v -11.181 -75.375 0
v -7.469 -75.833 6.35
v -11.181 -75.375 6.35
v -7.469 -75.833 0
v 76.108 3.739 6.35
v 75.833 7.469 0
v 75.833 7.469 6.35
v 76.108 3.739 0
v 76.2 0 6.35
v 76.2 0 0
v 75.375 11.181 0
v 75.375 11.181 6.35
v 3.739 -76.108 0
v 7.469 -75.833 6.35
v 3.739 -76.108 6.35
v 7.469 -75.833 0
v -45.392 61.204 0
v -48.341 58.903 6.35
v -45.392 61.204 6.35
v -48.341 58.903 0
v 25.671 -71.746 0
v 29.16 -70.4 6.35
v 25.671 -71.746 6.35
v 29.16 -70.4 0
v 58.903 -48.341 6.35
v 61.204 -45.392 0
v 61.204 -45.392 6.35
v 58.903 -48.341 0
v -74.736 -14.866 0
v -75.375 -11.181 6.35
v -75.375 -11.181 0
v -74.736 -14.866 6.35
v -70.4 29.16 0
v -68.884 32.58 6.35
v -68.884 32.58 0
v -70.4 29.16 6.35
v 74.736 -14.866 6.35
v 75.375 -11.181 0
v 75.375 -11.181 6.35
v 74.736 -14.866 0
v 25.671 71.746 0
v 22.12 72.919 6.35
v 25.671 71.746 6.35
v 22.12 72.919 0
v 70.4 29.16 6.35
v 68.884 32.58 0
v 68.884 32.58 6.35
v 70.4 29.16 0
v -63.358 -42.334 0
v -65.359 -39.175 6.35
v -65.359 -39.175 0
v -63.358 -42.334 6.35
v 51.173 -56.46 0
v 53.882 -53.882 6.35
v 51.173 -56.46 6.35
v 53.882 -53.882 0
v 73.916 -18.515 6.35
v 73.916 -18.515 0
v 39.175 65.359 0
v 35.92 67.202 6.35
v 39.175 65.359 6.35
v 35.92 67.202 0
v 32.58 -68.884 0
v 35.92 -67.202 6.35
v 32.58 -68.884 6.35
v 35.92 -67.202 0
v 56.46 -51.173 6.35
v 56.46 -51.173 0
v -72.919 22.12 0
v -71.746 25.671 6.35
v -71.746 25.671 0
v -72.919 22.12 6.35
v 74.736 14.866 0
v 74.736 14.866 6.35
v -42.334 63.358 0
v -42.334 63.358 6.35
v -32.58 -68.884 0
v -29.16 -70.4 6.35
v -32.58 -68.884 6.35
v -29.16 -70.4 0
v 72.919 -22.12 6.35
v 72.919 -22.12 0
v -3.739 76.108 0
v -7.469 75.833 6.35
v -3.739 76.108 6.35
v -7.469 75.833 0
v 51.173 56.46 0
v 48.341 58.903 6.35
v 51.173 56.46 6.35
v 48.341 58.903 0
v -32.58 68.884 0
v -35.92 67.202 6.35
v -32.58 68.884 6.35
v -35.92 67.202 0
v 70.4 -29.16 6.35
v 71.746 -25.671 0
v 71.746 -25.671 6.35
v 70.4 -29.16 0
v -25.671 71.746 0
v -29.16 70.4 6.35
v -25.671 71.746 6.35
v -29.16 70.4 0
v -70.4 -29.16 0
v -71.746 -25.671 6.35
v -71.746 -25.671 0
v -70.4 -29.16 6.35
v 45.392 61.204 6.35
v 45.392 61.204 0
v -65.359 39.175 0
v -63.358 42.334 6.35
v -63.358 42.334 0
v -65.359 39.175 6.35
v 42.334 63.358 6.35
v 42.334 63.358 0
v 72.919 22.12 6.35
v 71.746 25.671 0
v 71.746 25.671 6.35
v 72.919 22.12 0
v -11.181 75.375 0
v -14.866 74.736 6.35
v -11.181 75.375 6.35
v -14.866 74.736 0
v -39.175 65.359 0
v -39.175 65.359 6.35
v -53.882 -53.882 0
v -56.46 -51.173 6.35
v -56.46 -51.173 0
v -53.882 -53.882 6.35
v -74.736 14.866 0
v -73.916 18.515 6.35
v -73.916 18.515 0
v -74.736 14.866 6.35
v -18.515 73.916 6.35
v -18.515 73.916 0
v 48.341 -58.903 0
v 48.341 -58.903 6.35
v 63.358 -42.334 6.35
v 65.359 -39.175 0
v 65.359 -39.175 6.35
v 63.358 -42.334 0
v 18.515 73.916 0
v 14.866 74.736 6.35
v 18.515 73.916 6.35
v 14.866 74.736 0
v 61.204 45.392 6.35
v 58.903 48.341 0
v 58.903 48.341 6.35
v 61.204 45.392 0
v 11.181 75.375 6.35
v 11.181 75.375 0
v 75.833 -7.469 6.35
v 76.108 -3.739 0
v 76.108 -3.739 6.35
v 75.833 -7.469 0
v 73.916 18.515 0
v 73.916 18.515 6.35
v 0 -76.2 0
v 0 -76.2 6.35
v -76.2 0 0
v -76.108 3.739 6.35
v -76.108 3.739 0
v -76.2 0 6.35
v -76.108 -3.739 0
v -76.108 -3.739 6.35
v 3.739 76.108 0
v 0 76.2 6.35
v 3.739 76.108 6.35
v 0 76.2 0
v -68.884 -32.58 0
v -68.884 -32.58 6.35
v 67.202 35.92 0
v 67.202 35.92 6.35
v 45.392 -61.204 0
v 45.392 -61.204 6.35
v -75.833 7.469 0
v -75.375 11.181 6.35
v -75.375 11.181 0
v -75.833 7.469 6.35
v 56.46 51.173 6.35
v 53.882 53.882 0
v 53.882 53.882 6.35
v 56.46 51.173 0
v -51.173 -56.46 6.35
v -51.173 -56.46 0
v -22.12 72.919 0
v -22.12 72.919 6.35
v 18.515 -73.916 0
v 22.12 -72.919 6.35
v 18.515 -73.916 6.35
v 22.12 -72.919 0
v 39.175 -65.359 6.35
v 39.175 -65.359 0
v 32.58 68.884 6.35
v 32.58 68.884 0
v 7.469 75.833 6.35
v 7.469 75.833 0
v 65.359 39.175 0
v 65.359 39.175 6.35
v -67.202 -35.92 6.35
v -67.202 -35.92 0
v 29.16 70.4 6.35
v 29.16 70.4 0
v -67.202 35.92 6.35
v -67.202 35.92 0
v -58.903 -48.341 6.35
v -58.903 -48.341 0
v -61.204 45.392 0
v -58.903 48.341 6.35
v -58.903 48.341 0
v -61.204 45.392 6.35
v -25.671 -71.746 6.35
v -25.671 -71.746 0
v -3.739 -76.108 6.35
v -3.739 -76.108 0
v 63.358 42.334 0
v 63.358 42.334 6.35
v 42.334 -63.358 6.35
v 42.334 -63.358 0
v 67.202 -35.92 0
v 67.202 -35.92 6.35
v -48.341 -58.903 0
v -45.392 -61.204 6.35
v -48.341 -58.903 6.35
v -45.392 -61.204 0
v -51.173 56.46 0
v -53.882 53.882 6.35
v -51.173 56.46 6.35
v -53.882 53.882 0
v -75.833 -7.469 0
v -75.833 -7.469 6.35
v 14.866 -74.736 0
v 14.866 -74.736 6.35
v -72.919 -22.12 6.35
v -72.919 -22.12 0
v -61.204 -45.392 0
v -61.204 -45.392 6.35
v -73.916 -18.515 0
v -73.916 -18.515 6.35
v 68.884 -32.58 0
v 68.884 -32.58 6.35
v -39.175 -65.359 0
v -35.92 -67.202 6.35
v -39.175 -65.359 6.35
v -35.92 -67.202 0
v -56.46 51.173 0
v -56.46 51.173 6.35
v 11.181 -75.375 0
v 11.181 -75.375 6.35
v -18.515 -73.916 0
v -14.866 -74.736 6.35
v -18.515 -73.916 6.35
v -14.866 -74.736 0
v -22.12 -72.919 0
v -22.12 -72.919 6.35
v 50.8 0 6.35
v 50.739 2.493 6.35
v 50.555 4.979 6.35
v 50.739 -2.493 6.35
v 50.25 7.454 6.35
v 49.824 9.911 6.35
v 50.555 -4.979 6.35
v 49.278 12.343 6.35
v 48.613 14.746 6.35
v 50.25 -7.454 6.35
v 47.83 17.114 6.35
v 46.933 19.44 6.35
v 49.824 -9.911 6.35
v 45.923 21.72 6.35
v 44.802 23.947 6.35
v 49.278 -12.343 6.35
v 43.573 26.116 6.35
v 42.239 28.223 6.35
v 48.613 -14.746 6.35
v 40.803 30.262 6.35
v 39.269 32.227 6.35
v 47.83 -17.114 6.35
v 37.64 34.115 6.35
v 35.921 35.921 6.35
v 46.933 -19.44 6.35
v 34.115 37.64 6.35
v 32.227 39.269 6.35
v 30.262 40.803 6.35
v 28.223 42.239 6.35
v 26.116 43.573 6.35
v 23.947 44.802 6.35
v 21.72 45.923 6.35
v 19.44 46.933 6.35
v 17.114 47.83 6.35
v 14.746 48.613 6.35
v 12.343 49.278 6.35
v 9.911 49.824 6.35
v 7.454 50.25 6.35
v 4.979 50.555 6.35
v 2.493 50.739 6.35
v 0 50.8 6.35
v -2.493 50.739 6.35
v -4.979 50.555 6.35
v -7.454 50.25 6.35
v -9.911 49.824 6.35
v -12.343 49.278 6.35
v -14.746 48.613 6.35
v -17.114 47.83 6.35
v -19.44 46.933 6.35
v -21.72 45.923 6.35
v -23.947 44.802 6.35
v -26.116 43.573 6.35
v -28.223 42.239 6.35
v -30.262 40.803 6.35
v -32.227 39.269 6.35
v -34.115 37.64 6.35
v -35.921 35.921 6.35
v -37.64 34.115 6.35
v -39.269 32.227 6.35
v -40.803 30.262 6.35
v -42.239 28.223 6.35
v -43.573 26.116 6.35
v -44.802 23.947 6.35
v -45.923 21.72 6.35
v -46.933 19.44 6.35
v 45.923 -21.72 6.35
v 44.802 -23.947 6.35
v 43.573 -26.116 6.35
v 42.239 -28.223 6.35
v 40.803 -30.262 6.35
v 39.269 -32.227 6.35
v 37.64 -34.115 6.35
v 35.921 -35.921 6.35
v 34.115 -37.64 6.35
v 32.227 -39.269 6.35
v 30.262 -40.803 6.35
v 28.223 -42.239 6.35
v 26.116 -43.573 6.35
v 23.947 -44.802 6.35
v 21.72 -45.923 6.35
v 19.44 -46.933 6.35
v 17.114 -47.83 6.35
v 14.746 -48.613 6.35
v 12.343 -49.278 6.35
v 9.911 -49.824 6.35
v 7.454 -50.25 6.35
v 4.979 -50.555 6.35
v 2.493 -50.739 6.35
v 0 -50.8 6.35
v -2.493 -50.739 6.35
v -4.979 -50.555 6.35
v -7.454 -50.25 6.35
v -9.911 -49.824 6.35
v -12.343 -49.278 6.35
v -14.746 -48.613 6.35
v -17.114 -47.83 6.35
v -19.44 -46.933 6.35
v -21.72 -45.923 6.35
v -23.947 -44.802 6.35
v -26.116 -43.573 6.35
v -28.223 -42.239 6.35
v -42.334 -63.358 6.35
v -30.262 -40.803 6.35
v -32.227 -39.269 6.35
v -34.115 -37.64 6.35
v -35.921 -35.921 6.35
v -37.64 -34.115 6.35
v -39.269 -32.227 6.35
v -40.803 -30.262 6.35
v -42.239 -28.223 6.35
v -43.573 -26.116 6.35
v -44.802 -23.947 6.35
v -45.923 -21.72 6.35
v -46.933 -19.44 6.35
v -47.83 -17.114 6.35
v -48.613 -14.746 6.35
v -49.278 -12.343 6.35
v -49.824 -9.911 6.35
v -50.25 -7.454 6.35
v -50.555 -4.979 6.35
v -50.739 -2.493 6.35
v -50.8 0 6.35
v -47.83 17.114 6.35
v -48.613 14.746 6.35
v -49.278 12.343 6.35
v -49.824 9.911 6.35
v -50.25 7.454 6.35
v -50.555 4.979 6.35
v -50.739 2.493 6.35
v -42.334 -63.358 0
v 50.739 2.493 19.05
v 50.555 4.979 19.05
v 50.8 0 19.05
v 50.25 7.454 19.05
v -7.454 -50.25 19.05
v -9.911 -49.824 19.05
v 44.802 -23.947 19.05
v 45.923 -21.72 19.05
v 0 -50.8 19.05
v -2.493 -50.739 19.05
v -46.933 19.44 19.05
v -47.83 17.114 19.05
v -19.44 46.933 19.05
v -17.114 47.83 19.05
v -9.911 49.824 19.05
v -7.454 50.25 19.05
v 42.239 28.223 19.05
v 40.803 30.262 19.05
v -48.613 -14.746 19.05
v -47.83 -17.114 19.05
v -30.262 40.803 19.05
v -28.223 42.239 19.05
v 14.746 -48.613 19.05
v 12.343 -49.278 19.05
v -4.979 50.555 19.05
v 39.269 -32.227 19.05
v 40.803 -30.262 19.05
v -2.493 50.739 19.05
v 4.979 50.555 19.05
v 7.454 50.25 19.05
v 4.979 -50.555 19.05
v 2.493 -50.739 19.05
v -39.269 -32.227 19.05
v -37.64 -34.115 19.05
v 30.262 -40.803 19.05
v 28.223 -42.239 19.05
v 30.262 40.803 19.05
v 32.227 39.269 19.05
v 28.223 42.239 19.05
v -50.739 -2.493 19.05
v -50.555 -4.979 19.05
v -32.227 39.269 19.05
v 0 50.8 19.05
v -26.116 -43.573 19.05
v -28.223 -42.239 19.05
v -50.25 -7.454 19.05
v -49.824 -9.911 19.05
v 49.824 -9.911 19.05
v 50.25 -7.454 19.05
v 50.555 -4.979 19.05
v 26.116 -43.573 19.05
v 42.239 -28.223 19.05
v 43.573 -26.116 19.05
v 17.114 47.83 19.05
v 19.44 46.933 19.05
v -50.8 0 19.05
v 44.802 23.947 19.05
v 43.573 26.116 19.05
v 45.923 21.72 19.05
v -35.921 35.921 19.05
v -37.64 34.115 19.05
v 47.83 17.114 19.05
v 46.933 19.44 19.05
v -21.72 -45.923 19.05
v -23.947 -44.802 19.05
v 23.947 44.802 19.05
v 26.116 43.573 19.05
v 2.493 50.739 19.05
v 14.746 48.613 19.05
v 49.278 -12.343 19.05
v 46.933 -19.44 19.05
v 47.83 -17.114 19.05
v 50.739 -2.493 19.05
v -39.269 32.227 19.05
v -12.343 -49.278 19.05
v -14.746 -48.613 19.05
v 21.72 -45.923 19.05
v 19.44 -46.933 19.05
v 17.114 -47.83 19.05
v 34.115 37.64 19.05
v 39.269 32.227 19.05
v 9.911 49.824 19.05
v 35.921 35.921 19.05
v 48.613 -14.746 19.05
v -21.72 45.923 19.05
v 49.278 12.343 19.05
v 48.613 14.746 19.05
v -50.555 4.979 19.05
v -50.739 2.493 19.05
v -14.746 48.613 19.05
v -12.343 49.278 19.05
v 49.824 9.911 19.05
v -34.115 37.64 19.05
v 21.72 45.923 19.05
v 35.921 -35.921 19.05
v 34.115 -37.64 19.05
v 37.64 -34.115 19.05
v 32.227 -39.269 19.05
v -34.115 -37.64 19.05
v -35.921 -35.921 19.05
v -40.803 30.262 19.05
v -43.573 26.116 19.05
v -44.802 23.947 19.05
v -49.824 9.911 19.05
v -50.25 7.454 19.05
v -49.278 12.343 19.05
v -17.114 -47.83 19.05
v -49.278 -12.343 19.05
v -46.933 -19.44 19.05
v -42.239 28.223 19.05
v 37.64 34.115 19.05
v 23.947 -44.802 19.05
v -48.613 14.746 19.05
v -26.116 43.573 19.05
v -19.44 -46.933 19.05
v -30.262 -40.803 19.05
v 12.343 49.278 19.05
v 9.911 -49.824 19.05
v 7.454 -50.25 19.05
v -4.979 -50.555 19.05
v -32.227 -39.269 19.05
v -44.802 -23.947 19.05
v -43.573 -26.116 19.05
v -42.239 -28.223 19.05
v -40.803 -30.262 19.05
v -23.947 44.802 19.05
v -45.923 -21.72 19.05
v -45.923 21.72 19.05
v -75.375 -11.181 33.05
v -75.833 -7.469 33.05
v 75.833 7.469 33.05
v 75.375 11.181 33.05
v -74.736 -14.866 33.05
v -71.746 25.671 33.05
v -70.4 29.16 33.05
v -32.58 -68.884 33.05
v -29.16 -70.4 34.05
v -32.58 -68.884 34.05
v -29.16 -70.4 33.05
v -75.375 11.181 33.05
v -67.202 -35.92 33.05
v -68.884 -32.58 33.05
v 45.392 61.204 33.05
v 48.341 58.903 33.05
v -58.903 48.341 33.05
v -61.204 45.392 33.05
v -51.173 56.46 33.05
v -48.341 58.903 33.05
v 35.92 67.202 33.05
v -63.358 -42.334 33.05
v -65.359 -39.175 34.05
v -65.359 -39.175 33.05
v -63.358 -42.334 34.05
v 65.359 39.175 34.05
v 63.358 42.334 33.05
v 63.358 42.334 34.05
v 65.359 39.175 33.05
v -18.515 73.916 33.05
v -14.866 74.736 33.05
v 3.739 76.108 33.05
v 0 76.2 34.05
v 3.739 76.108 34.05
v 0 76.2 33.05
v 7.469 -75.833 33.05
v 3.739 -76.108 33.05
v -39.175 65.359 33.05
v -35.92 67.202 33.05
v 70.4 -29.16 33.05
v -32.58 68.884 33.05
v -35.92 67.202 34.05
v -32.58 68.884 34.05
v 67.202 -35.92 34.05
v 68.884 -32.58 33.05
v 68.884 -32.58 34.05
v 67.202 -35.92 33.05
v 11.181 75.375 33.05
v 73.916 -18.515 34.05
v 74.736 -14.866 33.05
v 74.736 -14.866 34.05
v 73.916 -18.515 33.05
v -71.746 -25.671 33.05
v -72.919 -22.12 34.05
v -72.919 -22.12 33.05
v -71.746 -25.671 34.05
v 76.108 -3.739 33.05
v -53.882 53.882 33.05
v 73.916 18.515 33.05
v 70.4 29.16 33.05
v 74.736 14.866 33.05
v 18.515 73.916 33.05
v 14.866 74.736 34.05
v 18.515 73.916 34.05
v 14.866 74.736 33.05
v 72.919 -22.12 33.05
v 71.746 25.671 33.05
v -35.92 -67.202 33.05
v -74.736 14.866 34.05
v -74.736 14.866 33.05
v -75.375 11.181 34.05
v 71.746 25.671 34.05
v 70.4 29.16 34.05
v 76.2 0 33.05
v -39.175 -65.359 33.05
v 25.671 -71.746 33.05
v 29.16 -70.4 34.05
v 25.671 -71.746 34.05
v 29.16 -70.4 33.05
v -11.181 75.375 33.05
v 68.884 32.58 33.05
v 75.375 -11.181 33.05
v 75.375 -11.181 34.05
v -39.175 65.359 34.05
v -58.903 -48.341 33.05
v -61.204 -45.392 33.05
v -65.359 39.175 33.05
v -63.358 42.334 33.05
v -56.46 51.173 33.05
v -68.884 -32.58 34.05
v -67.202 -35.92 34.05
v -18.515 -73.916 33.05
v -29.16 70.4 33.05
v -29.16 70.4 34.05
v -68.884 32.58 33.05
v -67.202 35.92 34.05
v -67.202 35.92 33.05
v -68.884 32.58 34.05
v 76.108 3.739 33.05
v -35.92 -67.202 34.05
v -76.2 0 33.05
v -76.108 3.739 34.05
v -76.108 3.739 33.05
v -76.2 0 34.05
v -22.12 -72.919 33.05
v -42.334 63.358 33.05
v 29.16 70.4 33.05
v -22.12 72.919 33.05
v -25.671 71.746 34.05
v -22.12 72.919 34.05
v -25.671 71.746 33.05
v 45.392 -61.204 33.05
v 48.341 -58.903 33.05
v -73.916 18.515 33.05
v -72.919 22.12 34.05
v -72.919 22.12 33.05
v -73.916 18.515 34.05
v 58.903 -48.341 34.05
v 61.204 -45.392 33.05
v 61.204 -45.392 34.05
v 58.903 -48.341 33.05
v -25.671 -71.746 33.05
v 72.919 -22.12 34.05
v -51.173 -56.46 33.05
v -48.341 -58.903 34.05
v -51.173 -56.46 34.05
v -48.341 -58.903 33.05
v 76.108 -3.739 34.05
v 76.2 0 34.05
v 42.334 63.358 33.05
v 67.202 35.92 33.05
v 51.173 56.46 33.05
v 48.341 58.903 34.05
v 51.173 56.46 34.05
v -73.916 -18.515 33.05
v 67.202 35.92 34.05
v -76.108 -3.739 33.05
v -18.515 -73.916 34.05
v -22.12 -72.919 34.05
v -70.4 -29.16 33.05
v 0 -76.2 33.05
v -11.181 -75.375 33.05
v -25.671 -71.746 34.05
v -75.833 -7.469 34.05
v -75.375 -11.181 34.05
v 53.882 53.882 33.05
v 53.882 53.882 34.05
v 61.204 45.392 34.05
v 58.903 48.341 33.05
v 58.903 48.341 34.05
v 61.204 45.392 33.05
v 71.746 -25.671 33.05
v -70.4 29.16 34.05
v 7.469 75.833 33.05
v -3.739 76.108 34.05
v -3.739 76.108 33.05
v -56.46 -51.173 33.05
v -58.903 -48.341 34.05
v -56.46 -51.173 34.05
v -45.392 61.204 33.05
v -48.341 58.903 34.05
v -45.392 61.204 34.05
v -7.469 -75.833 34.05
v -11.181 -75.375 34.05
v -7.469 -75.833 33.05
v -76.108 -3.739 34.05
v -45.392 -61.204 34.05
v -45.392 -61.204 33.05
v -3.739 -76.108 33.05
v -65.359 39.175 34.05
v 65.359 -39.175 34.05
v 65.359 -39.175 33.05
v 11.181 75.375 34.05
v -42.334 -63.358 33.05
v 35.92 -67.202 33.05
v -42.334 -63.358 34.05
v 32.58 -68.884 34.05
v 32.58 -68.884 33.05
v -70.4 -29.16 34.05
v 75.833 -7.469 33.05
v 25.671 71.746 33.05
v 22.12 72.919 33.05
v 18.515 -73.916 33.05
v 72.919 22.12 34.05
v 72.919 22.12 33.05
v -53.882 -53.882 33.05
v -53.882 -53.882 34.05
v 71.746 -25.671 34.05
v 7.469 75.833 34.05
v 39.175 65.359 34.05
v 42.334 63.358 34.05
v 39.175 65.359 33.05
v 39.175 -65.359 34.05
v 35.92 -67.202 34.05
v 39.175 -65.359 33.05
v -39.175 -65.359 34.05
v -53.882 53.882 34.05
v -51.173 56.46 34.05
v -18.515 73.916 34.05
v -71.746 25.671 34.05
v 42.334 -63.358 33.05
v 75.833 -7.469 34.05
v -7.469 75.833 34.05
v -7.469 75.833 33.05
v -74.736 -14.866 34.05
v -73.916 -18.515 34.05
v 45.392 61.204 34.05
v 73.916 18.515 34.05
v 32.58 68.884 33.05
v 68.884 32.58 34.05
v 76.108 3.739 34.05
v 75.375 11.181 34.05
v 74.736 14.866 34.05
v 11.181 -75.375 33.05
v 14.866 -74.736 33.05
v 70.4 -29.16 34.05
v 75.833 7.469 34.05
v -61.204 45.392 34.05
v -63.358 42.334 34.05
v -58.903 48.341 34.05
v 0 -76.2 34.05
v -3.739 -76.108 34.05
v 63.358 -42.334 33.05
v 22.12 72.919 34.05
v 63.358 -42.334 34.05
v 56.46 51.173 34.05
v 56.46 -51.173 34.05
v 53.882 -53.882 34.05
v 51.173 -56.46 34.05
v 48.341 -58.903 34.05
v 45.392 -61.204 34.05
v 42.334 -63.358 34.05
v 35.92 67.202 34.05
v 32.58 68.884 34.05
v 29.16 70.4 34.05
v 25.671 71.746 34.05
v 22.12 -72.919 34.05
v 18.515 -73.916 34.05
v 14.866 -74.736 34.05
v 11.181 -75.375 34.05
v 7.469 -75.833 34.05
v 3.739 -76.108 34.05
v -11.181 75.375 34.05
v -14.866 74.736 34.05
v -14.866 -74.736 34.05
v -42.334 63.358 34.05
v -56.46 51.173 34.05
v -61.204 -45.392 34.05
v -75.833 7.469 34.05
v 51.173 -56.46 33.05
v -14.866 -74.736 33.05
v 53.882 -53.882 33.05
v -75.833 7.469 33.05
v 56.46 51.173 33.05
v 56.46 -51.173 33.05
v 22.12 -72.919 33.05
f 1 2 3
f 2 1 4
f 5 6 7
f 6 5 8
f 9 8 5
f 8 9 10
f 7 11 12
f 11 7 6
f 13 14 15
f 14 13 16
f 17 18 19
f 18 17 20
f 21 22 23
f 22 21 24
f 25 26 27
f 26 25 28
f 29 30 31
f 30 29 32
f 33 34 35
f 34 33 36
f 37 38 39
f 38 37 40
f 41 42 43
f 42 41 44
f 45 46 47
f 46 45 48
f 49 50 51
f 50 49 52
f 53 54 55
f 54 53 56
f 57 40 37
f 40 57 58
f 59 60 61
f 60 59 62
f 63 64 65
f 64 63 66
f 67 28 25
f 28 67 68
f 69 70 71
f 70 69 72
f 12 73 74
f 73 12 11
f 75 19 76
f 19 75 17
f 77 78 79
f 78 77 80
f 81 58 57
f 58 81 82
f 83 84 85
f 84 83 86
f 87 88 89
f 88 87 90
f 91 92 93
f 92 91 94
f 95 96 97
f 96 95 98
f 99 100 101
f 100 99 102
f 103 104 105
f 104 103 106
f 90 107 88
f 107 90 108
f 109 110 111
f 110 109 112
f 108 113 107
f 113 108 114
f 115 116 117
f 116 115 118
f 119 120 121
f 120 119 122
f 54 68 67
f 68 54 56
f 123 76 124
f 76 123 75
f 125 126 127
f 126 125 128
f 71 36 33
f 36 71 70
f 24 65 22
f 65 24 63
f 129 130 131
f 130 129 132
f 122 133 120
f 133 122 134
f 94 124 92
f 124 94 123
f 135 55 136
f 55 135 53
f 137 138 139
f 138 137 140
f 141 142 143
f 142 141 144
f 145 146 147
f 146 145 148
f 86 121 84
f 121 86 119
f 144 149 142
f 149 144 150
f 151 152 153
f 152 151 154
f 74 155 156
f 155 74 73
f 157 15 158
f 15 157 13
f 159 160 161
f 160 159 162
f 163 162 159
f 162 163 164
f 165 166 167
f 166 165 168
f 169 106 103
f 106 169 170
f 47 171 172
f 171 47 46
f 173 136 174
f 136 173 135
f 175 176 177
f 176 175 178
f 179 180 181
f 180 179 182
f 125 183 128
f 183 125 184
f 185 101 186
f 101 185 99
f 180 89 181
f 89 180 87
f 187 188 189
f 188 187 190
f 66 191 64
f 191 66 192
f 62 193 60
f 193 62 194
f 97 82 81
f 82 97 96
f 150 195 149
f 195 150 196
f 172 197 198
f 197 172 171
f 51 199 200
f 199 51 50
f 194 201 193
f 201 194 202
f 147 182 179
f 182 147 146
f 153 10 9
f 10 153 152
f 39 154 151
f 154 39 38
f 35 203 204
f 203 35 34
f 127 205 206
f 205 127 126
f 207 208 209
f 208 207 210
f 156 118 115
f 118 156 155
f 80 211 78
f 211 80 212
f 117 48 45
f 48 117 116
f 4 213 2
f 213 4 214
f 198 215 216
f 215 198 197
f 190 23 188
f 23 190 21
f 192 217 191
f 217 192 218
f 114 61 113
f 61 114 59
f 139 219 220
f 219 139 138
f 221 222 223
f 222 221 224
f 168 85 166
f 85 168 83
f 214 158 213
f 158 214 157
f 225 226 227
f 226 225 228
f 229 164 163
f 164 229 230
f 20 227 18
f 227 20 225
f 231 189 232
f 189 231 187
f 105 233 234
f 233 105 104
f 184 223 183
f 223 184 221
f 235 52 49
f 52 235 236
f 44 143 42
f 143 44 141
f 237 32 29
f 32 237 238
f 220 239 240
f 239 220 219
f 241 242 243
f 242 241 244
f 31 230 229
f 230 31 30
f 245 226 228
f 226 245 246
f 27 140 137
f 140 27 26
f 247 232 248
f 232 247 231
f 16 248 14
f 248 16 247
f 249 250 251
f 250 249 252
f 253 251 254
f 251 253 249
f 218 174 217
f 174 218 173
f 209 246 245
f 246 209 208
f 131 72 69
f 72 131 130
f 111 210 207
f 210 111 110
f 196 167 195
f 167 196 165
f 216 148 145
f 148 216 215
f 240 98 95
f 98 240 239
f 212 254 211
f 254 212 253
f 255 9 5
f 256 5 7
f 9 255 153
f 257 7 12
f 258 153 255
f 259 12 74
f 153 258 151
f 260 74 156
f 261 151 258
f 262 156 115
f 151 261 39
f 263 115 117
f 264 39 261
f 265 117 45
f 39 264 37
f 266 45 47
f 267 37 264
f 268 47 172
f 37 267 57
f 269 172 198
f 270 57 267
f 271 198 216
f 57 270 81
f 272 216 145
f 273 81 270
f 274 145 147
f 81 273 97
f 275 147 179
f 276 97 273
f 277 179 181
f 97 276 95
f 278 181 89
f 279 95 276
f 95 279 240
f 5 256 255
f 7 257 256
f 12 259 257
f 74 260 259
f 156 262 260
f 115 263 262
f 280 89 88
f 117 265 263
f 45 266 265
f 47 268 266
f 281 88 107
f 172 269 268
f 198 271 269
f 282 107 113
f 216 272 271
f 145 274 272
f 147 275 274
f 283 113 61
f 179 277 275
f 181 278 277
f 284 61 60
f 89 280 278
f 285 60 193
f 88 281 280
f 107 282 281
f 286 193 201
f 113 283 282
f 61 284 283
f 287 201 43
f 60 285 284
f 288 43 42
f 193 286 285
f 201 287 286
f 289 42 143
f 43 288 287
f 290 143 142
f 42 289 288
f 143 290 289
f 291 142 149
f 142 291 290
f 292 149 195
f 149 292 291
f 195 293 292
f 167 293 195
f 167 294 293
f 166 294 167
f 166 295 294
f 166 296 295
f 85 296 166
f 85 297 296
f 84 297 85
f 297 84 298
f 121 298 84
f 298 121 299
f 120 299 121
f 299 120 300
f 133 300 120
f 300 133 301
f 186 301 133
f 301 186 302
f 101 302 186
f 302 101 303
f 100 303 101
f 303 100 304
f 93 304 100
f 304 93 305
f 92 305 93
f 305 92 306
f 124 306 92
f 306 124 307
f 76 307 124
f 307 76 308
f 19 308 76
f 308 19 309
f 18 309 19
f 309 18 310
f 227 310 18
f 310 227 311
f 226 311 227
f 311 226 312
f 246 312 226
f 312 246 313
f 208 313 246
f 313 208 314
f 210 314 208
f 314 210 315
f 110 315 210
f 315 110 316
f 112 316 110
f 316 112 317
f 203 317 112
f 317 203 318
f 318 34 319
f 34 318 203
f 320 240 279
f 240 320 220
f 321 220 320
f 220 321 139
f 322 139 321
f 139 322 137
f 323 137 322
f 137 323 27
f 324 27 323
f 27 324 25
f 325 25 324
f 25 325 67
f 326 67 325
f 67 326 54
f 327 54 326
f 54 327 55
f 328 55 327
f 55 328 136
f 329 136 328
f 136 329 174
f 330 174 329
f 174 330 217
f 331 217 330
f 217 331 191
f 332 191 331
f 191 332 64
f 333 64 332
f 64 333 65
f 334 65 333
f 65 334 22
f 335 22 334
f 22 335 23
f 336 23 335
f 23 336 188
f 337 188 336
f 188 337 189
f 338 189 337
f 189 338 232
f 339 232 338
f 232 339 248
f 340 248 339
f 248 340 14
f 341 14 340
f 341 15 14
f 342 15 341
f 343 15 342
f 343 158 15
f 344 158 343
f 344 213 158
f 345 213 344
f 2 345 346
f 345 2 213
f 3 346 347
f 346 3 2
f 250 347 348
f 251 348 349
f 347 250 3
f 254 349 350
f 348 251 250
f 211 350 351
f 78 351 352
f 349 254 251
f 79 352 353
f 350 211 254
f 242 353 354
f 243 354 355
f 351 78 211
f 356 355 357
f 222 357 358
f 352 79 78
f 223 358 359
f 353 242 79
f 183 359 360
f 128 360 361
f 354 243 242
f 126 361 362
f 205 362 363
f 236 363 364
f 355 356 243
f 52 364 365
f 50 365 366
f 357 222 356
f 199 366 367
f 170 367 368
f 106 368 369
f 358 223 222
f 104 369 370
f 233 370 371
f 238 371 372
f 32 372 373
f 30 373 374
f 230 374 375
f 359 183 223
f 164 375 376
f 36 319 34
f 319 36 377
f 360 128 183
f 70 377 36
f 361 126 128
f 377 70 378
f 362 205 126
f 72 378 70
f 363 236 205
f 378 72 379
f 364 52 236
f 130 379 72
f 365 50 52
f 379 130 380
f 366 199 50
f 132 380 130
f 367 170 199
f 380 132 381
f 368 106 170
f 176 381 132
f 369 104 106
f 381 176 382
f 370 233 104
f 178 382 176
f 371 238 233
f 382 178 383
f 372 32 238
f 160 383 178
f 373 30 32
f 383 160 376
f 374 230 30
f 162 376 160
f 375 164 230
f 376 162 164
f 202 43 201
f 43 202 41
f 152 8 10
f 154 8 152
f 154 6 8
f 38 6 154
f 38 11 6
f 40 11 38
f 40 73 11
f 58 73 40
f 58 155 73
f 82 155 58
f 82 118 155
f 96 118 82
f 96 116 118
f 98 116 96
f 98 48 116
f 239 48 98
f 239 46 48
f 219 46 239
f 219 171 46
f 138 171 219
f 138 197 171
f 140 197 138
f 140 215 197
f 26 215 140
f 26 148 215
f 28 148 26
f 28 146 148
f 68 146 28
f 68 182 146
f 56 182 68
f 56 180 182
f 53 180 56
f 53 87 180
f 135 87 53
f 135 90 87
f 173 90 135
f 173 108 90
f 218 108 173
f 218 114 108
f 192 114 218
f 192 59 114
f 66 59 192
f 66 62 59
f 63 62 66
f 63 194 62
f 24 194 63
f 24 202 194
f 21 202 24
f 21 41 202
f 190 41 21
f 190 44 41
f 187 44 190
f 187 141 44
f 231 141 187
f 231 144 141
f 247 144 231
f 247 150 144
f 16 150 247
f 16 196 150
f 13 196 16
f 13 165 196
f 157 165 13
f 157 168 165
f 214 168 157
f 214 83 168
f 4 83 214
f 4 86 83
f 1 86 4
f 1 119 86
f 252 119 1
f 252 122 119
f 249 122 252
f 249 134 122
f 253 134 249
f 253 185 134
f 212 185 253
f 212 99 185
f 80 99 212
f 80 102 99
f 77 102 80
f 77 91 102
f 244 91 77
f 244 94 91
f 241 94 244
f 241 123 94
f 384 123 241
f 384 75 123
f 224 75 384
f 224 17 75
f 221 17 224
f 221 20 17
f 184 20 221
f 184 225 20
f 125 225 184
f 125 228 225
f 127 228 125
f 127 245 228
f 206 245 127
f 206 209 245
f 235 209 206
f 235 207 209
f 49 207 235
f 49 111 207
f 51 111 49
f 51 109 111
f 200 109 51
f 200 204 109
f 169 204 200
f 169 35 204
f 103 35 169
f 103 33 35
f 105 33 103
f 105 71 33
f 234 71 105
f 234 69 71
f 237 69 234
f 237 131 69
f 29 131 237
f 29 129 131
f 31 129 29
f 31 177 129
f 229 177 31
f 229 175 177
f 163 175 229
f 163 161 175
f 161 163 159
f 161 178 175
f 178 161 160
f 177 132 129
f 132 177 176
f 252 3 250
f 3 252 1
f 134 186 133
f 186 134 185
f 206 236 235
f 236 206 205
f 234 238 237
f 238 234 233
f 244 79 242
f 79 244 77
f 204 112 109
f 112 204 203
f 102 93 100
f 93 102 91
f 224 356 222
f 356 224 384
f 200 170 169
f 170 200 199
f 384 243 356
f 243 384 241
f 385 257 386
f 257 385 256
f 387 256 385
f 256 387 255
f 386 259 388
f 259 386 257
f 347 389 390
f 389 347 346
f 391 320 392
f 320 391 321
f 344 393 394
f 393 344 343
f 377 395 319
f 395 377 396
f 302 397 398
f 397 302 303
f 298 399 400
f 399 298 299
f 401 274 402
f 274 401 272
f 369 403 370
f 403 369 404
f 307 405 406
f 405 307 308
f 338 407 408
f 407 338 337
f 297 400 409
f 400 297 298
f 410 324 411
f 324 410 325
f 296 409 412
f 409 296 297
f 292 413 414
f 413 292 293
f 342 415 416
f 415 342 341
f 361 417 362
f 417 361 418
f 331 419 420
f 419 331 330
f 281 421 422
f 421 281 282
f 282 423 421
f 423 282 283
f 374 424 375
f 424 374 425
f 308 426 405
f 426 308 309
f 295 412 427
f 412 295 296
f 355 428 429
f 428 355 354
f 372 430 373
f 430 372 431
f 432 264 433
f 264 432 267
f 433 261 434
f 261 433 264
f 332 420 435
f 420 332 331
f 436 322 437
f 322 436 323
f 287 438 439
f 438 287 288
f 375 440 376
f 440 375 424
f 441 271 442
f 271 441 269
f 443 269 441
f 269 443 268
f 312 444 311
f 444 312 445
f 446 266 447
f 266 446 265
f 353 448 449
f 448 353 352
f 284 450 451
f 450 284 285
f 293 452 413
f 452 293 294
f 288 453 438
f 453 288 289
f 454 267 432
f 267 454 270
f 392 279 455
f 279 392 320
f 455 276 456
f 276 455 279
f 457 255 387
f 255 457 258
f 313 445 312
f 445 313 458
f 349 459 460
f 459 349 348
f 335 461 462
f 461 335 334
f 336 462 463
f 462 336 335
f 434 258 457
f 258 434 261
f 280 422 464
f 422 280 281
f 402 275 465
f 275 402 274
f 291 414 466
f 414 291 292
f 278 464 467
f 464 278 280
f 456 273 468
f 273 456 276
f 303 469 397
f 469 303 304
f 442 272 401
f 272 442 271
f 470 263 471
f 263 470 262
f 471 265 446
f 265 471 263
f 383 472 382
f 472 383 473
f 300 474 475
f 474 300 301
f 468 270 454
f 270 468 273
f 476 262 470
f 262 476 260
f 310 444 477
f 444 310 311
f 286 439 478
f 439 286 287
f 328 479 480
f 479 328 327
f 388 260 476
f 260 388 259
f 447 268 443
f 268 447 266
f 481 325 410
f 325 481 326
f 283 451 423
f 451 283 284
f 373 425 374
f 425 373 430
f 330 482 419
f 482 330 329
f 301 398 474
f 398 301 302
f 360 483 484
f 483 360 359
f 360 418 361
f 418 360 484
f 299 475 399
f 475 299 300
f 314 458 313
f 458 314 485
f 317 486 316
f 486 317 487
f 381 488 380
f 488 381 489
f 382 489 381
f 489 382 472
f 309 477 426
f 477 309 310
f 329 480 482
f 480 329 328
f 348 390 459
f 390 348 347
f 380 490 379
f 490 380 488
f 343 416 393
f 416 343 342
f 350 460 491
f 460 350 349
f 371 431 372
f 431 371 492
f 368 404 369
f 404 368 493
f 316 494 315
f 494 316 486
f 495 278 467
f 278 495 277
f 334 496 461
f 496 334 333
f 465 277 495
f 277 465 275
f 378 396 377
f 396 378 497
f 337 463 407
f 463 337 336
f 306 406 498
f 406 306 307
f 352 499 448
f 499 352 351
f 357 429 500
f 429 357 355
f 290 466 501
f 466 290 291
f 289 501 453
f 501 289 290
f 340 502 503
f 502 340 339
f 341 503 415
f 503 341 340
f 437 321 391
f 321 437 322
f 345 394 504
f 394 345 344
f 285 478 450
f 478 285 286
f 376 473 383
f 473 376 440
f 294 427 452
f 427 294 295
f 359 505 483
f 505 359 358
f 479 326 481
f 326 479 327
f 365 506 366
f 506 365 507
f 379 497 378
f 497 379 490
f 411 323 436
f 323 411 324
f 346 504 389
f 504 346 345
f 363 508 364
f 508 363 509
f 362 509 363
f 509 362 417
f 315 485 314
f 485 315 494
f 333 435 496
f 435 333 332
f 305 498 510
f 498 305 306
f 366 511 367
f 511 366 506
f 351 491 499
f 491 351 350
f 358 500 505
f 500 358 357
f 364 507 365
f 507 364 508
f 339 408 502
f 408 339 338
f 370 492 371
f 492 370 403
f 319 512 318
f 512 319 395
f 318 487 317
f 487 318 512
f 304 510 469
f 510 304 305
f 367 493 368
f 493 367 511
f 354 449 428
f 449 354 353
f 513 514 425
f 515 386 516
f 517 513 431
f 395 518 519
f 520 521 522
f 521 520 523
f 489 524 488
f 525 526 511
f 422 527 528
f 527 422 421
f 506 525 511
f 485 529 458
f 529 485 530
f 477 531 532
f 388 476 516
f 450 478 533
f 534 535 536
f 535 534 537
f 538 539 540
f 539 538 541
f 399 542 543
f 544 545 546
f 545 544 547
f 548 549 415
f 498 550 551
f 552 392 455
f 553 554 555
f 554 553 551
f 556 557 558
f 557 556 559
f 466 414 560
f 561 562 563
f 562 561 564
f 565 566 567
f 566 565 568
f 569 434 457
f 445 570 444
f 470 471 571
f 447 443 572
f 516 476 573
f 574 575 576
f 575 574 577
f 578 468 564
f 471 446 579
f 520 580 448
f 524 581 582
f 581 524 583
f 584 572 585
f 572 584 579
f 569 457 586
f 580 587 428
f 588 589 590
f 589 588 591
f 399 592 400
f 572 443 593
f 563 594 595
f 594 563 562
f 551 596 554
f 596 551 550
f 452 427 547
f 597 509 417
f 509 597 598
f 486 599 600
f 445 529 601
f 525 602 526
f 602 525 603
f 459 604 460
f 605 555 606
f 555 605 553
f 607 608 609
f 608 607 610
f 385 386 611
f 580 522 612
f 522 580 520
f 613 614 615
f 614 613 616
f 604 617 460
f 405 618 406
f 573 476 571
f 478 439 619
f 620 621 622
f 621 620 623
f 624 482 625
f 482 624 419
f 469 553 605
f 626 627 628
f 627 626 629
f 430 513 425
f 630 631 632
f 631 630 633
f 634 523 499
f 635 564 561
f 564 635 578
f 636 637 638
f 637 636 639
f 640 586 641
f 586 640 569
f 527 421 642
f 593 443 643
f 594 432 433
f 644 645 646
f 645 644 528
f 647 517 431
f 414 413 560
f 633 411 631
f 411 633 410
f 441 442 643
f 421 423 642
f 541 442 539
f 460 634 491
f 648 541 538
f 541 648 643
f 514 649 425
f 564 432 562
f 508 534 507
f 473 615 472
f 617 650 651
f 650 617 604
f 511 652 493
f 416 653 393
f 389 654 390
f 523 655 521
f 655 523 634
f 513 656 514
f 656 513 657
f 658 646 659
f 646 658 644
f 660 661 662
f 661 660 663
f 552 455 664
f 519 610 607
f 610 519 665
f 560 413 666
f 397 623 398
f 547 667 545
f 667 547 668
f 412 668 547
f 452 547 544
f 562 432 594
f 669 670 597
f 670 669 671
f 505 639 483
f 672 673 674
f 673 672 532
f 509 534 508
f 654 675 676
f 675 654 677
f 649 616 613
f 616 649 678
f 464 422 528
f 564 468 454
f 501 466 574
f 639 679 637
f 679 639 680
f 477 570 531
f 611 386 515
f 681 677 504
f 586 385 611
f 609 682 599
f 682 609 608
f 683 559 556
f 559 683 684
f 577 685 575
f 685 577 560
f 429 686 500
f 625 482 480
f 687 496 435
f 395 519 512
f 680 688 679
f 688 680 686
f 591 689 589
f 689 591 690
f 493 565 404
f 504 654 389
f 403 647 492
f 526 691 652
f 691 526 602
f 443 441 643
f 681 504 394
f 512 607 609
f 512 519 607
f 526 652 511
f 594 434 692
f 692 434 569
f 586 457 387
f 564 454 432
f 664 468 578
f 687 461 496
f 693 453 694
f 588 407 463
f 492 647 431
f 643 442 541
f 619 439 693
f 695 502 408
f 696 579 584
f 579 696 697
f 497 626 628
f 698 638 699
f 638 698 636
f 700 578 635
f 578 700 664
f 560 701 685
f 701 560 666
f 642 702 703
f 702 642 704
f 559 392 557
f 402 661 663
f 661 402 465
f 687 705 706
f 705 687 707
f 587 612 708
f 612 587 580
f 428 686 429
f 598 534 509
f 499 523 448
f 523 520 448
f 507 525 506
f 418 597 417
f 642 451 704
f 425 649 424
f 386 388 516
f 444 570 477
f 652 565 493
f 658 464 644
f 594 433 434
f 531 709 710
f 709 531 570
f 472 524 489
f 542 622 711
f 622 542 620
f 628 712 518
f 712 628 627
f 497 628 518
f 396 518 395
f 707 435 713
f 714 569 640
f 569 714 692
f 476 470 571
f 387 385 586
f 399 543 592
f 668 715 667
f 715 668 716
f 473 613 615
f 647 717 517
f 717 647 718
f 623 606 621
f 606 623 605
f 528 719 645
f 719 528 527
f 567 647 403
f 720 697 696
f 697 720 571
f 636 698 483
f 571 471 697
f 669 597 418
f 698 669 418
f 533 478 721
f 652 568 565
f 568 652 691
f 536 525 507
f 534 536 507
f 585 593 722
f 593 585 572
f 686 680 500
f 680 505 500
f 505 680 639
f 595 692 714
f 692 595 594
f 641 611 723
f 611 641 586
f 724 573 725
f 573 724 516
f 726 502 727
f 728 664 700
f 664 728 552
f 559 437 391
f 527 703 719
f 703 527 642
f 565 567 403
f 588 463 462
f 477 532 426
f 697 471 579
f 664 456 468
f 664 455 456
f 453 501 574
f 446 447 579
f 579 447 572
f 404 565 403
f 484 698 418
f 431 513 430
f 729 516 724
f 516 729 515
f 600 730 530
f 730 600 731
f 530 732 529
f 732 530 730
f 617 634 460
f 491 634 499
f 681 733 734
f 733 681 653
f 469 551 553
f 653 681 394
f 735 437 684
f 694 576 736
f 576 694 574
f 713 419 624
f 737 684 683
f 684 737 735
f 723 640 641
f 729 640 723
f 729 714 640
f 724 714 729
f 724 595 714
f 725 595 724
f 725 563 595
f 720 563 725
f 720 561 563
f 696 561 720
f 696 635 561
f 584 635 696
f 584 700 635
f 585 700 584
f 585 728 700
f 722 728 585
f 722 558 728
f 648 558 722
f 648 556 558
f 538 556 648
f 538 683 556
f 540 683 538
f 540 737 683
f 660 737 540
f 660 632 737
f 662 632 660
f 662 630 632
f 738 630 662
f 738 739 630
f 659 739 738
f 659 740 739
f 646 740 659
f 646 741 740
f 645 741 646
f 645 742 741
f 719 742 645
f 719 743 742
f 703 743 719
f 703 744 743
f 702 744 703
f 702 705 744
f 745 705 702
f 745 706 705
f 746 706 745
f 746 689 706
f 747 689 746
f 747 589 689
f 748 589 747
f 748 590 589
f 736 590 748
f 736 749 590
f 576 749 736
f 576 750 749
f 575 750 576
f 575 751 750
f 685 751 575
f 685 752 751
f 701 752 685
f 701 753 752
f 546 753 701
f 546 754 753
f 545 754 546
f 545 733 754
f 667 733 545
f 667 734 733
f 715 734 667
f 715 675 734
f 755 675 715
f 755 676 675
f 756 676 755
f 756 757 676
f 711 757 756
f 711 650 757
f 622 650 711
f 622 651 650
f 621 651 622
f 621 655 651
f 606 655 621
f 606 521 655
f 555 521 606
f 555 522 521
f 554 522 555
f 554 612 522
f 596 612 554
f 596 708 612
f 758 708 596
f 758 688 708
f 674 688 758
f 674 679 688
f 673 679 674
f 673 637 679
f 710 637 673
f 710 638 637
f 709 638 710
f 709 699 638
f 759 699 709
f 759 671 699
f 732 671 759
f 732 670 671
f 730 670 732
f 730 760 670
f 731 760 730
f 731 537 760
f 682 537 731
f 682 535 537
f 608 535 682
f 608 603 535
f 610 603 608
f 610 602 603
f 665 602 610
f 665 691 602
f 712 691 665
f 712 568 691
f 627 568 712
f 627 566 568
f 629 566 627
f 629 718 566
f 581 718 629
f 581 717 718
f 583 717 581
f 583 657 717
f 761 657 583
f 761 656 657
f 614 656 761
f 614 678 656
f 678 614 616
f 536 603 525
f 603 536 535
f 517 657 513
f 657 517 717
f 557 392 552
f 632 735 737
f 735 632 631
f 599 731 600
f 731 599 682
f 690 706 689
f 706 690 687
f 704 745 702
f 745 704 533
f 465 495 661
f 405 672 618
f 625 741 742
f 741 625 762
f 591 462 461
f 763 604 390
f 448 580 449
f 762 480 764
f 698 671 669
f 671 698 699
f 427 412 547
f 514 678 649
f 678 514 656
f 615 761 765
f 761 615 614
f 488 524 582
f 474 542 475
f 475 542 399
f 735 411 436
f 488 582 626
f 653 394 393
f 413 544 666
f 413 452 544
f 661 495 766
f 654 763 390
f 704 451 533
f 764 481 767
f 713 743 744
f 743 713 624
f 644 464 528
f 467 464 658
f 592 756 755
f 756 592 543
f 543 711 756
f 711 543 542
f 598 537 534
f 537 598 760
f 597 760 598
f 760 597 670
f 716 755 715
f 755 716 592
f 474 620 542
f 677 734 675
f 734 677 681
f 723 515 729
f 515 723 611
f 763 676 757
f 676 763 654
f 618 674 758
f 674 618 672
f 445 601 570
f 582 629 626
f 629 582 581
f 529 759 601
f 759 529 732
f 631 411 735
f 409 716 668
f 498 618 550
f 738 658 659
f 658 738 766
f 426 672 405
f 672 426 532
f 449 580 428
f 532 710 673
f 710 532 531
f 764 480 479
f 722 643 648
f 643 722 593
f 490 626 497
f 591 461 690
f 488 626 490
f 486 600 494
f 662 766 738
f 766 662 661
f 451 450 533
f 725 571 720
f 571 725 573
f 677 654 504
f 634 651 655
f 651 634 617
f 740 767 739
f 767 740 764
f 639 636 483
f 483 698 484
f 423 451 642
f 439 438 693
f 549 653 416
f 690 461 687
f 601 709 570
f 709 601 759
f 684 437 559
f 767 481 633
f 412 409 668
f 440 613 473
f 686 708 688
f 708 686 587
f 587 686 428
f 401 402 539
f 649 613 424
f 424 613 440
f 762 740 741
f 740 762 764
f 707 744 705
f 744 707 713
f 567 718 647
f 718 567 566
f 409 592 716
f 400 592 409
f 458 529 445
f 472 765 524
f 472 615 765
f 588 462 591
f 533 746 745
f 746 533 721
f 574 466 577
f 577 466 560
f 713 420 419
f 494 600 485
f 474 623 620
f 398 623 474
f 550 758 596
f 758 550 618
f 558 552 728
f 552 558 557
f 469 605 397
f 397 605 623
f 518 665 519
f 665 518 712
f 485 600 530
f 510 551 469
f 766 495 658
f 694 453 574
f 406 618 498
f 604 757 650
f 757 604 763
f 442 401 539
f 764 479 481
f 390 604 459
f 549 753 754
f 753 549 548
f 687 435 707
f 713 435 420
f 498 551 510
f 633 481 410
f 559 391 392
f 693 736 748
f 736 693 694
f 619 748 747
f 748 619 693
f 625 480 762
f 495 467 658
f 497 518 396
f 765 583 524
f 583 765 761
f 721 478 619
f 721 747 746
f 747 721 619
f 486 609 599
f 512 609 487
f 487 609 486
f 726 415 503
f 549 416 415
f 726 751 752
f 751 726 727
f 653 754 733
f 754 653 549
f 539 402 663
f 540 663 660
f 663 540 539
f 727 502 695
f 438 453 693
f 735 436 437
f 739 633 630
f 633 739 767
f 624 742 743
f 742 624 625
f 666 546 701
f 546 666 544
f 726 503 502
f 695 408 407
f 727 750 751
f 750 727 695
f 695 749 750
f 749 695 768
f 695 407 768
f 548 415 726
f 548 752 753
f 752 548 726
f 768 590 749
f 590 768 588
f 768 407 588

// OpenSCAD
$inch = 25.4;

$detail = 128;

module hollow_cone(rb, rt, h, hollow) {
    difference() {
        hull() {
            cylinder(r=rb, h=1, $fn=$detail);
            translate([0,0,h-1]) {
                cylinder(r=rt, h=1, $fn=$detail);
            }
        }
        if (hollow) {
            translate([0,0,1]) {
                hull() {
                    cylinder(r=rb-2, h=1, $fn=$detail);
                    translate([0,0,h-1]) {
                        cylinder(r=rt-2, h=1, $fn=$detail);
                    }
                }
            }
        }
    }
}


cylinder(r=3*$inch, h=$inch/4, $fn=$detail);
translate([0,0,$inch/4]) {
    cylinder(r=2*$inch, h=$inch/2, $fn=$detail);
}
translate([0,0,3/4*$inch]) {
    hollow_cone(2*$inch, 3*$inch, 15, 0); // change the 0 to a 1 to make it hollow
}
